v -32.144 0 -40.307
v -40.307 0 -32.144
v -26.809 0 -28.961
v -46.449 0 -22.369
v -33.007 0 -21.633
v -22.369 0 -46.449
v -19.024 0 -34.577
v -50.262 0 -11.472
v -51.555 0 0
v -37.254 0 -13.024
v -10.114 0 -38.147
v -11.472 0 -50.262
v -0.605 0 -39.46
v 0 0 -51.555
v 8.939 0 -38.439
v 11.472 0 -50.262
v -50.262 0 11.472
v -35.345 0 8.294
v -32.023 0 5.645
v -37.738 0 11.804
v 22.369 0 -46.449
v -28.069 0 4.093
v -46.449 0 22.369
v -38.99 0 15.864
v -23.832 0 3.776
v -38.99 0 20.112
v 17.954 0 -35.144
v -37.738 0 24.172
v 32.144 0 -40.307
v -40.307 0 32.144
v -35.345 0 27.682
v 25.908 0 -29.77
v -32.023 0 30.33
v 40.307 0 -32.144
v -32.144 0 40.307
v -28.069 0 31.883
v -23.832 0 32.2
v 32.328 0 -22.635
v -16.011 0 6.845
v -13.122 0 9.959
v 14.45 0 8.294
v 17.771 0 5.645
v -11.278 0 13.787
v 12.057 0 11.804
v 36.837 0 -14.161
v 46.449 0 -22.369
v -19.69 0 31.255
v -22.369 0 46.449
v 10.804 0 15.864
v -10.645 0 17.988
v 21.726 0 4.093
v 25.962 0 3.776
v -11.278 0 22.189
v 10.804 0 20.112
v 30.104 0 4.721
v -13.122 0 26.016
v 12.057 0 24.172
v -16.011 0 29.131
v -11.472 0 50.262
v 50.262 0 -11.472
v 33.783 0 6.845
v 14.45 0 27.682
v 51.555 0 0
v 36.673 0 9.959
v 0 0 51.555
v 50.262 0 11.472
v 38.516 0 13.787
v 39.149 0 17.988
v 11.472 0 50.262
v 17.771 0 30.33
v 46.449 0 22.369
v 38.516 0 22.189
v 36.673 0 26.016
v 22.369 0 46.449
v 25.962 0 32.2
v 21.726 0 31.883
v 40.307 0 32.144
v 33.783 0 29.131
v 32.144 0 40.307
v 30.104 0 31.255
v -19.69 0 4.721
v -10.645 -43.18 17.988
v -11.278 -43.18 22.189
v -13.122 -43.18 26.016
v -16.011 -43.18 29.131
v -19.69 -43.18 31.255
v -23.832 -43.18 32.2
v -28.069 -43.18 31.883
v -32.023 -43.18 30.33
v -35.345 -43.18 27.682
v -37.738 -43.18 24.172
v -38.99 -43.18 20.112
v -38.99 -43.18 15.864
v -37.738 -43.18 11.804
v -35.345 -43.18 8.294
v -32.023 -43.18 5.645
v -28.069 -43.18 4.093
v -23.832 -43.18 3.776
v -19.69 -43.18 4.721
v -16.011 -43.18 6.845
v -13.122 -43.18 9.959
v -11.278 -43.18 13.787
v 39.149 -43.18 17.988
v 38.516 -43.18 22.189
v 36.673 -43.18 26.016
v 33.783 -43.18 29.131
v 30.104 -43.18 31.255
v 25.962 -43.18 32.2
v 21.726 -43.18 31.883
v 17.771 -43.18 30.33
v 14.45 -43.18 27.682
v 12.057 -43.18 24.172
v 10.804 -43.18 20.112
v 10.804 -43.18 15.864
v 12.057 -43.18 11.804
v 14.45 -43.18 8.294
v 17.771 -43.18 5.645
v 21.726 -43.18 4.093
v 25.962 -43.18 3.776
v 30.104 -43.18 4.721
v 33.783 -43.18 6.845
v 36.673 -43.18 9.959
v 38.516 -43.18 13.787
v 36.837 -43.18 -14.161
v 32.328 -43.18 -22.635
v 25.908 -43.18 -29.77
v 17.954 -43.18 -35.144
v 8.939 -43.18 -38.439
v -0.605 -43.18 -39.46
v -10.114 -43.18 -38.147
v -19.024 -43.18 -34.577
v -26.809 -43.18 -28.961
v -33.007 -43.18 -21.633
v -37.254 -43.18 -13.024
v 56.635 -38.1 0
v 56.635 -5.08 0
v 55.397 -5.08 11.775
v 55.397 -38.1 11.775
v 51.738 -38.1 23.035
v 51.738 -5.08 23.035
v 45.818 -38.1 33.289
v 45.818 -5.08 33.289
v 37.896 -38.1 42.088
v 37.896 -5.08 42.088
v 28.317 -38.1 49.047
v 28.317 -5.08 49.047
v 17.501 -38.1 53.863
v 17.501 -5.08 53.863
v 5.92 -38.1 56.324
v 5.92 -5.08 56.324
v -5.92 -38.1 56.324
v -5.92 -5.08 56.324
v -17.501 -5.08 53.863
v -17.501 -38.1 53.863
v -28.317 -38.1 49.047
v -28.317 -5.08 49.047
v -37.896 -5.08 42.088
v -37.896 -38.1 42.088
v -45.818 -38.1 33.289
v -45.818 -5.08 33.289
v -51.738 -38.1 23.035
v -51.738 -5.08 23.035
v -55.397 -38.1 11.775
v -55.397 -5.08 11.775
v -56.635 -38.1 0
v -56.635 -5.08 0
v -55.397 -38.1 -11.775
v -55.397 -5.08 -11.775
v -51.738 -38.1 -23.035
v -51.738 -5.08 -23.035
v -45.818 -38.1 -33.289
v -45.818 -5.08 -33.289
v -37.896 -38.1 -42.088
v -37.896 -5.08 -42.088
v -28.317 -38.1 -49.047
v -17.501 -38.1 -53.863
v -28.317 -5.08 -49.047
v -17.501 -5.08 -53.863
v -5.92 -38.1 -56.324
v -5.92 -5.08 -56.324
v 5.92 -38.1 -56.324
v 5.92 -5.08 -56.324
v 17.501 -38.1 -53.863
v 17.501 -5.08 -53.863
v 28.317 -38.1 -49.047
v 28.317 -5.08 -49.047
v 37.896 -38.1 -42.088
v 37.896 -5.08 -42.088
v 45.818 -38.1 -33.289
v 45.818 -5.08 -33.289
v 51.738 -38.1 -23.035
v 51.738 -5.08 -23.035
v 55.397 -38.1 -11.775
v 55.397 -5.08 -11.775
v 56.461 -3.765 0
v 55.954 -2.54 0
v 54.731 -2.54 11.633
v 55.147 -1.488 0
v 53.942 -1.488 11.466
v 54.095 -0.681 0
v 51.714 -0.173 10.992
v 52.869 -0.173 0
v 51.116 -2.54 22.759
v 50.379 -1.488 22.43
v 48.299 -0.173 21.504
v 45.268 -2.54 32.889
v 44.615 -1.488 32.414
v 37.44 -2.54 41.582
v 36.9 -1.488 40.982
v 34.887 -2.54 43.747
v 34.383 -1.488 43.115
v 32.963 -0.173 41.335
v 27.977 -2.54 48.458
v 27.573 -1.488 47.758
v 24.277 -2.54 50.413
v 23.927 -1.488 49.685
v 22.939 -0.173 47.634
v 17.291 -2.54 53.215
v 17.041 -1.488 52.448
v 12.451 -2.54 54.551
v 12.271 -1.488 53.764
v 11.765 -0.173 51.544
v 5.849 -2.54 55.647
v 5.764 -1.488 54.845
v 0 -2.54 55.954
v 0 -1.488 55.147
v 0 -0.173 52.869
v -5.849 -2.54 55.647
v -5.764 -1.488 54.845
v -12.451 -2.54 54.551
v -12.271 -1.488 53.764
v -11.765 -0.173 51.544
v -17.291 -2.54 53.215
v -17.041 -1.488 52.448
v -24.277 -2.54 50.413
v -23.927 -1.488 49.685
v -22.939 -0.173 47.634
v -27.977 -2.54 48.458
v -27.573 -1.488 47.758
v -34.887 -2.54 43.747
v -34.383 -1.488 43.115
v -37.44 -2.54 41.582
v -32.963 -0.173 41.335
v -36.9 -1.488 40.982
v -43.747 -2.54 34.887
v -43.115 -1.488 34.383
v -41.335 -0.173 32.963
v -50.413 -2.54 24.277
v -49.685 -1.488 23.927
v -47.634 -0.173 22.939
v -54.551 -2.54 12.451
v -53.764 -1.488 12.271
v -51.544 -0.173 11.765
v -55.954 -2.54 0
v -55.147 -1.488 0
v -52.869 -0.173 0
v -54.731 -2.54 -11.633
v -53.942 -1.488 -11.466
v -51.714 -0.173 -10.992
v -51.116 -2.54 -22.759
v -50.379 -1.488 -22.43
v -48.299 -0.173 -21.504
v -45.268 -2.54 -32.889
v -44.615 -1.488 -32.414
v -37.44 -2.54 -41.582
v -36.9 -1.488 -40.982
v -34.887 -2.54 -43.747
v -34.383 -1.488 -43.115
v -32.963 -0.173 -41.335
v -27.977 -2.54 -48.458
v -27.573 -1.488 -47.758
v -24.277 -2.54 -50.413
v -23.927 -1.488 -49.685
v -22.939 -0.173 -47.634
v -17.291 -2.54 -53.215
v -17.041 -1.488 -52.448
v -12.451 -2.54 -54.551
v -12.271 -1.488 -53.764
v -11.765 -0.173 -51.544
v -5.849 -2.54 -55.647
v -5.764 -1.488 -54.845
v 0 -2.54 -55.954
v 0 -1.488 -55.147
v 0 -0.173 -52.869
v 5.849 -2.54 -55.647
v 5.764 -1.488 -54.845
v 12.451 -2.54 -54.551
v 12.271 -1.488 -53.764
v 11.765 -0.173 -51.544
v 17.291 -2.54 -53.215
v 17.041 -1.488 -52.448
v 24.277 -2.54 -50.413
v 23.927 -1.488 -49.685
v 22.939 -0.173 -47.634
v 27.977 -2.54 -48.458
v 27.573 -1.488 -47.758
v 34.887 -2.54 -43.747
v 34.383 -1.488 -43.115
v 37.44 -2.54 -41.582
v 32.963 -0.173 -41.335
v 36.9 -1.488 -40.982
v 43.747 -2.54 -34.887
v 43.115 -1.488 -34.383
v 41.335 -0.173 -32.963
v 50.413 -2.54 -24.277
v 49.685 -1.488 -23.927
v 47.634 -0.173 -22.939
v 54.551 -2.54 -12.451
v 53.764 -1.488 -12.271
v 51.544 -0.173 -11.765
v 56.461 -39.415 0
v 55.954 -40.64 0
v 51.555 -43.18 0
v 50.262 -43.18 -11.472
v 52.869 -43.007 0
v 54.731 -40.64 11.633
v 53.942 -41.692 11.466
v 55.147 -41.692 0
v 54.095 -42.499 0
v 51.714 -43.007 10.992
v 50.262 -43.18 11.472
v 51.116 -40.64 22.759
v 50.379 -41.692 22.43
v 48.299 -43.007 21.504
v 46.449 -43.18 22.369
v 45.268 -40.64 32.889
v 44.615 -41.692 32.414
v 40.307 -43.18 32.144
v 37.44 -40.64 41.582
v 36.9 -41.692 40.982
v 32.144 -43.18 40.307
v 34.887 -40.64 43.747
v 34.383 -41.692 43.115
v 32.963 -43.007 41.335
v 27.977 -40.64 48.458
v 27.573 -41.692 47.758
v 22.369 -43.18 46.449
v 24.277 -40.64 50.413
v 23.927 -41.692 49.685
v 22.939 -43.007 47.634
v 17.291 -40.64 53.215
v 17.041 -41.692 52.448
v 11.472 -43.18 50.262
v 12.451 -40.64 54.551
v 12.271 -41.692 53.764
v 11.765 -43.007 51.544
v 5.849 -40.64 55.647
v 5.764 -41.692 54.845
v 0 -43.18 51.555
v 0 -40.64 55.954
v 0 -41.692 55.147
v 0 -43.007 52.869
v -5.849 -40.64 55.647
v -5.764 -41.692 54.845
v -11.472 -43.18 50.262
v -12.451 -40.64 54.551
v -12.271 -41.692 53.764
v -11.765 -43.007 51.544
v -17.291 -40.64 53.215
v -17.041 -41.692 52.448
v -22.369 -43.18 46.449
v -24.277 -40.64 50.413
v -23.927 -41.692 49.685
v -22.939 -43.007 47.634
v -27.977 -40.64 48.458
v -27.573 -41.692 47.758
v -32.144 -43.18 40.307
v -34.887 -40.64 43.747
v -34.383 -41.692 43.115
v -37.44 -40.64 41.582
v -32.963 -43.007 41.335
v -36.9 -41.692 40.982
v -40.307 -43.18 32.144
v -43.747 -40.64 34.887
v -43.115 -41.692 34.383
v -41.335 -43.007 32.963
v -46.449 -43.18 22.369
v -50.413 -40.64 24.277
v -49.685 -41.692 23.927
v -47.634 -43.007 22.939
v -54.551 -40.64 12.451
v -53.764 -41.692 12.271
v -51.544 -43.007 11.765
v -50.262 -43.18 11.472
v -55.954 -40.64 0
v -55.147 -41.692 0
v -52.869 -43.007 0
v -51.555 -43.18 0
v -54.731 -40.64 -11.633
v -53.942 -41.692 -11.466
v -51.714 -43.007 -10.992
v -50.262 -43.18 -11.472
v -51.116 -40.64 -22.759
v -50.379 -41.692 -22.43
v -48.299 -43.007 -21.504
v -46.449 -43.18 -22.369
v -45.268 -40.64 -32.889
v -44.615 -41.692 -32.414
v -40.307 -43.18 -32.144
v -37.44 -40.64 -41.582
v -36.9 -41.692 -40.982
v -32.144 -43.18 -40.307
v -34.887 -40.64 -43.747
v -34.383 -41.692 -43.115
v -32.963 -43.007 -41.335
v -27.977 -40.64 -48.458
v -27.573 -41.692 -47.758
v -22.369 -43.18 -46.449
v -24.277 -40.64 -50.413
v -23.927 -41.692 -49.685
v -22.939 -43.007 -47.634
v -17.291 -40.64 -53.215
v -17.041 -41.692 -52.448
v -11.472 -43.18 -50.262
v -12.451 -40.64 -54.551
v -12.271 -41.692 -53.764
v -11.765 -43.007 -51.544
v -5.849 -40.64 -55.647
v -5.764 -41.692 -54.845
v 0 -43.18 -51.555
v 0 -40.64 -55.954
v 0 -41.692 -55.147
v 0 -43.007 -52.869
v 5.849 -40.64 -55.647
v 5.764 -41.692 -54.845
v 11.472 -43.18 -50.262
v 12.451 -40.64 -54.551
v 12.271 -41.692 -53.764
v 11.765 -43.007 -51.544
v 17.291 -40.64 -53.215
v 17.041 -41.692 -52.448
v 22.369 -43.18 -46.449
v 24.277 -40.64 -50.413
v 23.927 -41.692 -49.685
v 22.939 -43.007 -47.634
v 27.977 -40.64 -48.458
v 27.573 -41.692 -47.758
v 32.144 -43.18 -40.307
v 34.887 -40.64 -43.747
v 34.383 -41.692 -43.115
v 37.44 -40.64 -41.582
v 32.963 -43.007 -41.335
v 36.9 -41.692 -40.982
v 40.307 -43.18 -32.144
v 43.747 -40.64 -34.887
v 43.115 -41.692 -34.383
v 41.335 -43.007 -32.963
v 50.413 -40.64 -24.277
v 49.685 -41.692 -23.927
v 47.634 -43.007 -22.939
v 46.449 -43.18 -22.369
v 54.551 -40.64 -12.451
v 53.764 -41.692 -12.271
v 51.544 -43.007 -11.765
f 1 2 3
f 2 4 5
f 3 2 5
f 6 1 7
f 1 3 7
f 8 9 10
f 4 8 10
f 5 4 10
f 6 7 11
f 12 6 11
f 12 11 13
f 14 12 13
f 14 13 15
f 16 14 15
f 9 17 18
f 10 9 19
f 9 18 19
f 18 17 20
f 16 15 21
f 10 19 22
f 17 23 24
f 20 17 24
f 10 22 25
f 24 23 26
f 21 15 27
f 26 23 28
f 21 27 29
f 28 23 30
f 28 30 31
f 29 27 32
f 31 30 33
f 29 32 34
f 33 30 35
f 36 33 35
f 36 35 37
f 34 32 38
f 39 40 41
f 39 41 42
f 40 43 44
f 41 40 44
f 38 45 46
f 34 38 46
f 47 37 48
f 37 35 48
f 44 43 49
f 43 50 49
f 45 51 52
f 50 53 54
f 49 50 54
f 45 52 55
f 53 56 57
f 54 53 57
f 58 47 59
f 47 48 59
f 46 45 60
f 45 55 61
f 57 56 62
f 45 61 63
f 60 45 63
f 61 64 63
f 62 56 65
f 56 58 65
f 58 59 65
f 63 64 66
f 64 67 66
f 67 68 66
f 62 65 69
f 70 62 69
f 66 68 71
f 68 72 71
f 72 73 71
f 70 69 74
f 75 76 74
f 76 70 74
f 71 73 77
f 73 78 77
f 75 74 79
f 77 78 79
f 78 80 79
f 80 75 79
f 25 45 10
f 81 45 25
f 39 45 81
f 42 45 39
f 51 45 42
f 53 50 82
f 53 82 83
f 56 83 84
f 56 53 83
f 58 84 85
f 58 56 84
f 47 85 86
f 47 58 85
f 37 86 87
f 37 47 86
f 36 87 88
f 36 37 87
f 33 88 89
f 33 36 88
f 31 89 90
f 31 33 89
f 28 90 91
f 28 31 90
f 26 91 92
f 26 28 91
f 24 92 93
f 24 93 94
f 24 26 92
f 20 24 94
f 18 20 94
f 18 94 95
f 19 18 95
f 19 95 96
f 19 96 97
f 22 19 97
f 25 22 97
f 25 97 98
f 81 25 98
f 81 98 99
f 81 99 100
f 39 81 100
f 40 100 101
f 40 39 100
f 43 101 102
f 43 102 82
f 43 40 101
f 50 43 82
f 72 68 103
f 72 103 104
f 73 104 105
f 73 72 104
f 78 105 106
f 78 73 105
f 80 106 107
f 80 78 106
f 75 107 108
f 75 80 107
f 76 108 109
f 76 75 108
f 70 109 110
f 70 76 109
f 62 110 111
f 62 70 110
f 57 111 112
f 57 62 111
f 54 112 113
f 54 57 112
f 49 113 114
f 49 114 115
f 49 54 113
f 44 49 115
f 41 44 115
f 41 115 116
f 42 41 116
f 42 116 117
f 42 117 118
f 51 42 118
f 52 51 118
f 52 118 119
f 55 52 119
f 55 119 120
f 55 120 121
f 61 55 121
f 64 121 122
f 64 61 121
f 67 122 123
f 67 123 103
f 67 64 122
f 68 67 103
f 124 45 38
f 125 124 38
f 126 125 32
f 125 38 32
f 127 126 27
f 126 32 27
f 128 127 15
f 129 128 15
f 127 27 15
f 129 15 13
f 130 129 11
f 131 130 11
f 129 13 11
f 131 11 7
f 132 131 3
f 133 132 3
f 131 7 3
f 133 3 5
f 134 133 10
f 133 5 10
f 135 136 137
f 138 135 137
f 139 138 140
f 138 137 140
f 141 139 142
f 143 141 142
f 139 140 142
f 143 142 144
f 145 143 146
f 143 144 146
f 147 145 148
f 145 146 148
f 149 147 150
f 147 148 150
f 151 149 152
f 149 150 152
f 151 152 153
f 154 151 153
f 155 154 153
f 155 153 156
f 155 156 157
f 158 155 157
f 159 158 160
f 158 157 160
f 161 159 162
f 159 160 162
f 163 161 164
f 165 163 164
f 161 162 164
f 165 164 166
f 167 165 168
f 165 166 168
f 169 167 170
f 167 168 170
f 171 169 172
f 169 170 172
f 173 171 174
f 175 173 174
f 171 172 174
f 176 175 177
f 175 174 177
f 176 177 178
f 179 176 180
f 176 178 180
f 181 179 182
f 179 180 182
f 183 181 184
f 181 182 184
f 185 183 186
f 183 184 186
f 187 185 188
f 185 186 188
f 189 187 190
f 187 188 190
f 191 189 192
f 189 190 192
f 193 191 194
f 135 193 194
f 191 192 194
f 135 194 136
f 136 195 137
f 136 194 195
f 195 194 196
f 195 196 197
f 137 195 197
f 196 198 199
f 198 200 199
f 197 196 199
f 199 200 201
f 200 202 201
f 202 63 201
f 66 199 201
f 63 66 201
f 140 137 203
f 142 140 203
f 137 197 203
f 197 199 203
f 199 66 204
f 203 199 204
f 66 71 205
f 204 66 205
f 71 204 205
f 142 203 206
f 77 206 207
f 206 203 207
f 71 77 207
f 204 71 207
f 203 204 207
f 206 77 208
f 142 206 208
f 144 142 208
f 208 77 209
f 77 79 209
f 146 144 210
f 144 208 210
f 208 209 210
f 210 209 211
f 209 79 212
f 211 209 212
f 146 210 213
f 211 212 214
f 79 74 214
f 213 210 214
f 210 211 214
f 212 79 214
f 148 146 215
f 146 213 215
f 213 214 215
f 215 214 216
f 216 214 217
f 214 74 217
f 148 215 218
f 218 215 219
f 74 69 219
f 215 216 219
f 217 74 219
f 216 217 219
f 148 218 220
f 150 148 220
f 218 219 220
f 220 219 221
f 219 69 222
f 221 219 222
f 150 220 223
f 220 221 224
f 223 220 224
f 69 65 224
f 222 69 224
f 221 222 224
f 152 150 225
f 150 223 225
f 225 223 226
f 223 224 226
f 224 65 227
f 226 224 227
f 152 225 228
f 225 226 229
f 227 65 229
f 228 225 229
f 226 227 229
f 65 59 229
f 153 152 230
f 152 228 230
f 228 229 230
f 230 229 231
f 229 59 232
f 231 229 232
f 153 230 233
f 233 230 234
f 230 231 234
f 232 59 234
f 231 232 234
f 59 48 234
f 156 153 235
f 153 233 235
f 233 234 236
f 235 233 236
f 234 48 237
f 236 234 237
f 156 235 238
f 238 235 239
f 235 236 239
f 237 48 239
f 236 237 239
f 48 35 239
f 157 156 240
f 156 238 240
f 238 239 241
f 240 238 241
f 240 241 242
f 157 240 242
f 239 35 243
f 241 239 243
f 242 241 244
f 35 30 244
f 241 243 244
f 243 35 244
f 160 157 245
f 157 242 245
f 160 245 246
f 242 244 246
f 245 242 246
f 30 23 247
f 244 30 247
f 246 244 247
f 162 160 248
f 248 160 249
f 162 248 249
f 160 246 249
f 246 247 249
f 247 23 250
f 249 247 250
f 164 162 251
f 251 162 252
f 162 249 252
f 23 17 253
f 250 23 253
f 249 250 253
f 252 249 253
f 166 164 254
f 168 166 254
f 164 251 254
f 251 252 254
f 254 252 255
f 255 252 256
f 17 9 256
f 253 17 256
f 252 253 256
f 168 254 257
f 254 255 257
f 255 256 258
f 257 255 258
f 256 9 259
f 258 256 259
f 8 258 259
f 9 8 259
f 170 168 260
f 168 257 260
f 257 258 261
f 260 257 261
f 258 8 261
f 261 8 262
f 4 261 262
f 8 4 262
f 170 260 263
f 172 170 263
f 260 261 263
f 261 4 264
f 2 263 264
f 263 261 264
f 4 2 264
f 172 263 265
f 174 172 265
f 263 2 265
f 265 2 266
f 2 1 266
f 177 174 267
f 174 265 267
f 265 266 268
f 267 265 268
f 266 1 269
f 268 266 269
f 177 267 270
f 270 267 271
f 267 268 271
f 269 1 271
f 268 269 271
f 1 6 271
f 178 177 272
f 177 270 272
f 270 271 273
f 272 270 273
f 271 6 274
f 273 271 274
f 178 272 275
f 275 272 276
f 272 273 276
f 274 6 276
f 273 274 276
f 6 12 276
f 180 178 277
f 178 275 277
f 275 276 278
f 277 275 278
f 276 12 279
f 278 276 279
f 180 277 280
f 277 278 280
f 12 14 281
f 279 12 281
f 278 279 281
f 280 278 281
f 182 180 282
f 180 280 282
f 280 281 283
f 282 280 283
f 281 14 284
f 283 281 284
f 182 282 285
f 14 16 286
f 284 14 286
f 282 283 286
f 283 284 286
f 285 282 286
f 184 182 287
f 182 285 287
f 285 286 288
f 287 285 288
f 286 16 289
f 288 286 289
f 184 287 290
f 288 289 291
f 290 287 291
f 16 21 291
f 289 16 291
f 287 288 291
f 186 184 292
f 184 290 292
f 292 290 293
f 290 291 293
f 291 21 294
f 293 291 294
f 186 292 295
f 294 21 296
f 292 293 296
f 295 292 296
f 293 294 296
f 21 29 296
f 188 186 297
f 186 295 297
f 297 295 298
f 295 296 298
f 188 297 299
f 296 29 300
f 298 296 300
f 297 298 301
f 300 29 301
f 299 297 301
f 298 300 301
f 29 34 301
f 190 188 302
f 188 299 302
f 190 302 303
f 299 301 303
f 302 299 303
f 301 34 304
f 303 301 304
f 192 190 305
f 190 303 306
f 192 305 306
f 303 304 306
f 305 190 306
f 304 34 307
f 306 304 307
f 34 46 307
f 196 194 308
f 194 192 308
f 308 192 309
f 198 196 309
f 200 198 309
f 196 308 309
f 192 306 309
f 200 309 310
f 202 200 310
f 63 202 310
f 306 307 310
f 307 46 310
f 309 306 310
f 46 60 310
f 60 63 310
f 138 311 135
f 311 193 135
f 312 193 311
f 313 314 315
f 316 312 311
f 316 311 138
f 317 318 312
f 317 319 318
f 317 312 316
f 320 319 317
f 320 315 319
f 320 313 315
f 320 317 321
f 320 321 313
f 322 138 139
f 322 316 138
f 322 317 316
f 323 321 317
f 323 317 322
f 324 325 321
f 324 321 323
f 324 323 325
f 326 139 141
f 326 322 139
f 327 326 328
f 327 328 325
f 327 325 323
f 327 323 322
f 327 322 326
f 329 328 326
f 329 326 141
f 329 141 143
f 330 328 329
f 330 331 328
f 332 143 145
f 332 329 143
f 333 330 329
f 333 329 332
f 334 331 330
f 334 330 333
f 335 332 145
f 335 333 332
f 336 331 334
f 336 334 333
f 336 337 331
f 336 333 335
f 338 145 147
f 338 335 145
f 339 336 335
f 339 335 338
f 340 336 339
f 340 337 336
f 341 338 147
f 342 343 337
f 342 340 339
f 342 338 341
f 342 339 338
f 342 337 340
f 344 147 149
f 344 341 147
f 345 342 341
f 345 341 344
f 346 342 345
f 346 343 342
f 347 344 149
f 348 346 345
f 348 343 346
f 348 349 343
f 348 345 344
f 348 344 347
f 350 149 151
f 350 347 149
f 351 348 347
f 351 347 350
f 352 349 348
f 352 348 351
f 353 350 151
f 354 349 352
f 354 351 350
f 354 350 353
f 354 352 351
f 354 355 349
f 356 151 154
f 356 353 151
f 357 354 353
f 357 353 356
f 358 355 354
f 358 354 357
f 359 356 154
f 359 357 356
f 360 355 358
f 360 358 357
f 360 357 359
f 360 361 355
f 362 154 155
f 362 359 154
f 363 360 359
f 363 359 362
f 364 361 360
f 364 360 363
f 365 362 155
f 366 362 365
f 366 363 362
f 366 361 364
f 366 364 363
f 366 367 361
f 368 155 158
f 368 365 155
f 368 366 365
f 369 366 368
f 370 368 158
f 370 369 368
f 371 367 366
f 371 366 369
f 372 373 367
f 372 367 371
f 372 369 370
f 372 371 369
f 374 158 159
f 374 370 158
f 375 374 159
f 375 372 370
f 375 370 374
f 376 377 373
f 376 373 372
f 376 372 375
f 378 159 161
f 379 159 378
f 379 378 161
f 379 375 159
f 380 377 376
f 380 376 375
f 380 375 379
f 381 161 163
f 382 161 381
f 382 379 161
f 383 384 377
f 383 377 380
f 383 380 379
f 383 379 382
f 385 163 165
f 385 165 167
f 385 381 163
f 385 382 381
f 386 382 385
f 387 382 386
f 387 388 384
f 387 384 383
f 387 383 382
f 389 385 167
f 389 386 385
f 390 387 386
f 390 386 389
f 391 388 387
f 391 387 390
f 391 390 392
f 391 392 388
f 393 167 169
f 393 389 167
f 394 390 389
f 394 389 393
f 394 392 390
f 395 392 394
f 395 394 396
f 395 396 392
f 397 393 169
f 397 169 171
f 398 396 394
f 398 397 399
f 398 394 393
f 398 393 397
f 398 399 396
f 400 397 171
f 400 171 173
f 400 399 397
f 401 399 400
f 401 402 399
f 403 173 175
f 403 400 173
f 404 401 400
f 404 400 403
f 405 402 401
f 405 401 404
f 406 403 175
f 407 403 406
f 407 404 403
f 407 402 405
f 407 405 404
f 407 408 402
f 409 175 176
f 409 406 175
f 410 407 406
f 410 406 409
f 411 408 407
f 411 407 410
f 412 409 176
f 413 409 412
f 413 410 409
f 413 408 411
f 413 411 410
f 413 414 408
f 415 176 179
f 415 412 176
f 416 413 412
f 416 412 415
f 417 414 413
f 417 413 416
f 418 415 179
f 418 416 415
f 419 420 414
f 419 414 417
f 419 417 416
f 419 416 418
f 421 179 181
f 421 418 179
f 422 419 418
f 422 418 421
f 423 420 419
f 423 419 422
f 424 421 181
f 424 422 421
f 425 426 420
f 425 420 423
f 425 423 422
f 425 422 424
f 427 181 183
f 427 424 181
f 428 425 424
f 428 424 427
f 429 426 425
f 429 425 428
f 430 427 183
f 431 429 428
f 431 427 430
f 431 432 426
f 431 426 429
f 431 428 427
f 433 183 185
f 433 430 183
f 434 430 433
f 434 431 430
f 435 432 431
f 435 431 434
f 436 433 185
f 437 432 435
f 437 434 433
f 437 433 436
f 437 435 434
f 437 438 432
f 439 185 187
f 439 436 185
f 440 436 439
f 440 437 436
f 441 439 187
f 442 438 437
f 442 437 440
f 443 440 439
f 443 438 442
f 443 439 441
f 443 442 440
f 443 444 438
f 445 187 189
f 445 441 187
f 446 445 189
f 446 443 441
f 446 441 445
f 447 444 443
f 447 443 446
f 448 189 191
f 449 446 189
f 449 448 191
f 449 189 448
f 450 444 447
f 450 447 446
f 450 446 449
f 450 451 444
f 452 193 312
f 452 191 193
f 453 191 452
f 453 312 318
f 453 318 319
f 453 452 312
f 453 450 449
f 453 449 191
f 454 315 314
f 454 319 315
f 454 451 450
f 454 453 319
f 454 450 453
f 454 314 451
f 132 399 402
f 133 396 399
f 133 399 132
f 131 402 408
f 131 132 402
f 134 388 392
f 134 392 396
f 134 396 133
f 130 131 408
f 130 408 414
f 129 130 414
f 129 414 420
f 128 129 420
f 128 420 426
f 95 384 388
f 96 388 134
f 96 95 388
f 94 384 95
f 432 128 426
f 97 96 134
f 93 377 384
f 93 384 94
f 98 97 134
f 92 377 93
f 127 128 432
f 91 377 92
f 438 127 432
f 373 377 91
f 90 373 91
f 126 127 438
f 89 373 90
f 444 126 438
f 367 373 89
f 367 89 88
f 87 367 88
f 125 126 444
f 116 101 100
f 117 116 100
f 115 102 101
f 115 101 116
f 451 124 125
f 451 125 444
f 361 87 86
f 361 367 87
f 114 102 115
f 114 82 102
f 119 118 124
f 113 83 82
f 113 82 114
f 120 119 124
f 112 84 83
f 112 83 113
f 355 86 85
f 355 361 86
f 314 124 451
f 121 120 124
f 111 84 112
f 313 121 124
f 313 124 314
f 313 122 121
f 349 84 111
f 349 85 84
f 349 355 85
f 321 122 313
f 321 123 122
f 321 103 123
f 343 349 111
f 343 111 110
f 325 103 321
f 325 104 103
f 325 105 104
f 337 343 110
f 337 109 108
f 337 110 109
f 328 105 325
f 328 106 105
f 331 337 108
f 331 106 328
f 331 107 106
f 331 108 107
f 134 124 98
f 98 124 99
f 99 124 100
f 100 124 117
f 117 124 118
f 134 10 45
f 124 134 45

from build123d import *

# Parameters (mm, degrees)
F0_R     = 56.634514
F0_R_2   = 14.25202
F1_DEPTH = 43.18
F2_R     = 5.08


with BuildPart() as f1:
    # F0 (on Front) → F1 (new body)
    with BuildSketch(Plane.XZ):
        Circle(F0_R)
        with BuildLine():
            ThreePointArc((36.836641, -14.160916), (-0.605346, -39.460147), (-37.253682, -13.024319))
            Line((-37.253682, -13.024319), (36.836641, -14.160916))
        make_face(mode=Mode.SUBTRACT)
        with Locations((-24.897231, 17.987859)):
            Circle(F0_R_2, mode=Mode.SUBTRACT)
        with Locations((24.897231, 17.987859)):
            Circle(F0_R_2, mode=Mode.SUBTRACT)
    extrude(amount=F1_DEPTH)

    # F2
    f2_edges = [f1.edges().sort_by_distance(p)[0] for p in [
        (-56.634514, -43.18, 0),
        (56.634514, -21.59, 0),
        (-56.634514, 0, 0),
    ]]
    fillet(f2_edges, radius=F2_R)


solid = f1.part
